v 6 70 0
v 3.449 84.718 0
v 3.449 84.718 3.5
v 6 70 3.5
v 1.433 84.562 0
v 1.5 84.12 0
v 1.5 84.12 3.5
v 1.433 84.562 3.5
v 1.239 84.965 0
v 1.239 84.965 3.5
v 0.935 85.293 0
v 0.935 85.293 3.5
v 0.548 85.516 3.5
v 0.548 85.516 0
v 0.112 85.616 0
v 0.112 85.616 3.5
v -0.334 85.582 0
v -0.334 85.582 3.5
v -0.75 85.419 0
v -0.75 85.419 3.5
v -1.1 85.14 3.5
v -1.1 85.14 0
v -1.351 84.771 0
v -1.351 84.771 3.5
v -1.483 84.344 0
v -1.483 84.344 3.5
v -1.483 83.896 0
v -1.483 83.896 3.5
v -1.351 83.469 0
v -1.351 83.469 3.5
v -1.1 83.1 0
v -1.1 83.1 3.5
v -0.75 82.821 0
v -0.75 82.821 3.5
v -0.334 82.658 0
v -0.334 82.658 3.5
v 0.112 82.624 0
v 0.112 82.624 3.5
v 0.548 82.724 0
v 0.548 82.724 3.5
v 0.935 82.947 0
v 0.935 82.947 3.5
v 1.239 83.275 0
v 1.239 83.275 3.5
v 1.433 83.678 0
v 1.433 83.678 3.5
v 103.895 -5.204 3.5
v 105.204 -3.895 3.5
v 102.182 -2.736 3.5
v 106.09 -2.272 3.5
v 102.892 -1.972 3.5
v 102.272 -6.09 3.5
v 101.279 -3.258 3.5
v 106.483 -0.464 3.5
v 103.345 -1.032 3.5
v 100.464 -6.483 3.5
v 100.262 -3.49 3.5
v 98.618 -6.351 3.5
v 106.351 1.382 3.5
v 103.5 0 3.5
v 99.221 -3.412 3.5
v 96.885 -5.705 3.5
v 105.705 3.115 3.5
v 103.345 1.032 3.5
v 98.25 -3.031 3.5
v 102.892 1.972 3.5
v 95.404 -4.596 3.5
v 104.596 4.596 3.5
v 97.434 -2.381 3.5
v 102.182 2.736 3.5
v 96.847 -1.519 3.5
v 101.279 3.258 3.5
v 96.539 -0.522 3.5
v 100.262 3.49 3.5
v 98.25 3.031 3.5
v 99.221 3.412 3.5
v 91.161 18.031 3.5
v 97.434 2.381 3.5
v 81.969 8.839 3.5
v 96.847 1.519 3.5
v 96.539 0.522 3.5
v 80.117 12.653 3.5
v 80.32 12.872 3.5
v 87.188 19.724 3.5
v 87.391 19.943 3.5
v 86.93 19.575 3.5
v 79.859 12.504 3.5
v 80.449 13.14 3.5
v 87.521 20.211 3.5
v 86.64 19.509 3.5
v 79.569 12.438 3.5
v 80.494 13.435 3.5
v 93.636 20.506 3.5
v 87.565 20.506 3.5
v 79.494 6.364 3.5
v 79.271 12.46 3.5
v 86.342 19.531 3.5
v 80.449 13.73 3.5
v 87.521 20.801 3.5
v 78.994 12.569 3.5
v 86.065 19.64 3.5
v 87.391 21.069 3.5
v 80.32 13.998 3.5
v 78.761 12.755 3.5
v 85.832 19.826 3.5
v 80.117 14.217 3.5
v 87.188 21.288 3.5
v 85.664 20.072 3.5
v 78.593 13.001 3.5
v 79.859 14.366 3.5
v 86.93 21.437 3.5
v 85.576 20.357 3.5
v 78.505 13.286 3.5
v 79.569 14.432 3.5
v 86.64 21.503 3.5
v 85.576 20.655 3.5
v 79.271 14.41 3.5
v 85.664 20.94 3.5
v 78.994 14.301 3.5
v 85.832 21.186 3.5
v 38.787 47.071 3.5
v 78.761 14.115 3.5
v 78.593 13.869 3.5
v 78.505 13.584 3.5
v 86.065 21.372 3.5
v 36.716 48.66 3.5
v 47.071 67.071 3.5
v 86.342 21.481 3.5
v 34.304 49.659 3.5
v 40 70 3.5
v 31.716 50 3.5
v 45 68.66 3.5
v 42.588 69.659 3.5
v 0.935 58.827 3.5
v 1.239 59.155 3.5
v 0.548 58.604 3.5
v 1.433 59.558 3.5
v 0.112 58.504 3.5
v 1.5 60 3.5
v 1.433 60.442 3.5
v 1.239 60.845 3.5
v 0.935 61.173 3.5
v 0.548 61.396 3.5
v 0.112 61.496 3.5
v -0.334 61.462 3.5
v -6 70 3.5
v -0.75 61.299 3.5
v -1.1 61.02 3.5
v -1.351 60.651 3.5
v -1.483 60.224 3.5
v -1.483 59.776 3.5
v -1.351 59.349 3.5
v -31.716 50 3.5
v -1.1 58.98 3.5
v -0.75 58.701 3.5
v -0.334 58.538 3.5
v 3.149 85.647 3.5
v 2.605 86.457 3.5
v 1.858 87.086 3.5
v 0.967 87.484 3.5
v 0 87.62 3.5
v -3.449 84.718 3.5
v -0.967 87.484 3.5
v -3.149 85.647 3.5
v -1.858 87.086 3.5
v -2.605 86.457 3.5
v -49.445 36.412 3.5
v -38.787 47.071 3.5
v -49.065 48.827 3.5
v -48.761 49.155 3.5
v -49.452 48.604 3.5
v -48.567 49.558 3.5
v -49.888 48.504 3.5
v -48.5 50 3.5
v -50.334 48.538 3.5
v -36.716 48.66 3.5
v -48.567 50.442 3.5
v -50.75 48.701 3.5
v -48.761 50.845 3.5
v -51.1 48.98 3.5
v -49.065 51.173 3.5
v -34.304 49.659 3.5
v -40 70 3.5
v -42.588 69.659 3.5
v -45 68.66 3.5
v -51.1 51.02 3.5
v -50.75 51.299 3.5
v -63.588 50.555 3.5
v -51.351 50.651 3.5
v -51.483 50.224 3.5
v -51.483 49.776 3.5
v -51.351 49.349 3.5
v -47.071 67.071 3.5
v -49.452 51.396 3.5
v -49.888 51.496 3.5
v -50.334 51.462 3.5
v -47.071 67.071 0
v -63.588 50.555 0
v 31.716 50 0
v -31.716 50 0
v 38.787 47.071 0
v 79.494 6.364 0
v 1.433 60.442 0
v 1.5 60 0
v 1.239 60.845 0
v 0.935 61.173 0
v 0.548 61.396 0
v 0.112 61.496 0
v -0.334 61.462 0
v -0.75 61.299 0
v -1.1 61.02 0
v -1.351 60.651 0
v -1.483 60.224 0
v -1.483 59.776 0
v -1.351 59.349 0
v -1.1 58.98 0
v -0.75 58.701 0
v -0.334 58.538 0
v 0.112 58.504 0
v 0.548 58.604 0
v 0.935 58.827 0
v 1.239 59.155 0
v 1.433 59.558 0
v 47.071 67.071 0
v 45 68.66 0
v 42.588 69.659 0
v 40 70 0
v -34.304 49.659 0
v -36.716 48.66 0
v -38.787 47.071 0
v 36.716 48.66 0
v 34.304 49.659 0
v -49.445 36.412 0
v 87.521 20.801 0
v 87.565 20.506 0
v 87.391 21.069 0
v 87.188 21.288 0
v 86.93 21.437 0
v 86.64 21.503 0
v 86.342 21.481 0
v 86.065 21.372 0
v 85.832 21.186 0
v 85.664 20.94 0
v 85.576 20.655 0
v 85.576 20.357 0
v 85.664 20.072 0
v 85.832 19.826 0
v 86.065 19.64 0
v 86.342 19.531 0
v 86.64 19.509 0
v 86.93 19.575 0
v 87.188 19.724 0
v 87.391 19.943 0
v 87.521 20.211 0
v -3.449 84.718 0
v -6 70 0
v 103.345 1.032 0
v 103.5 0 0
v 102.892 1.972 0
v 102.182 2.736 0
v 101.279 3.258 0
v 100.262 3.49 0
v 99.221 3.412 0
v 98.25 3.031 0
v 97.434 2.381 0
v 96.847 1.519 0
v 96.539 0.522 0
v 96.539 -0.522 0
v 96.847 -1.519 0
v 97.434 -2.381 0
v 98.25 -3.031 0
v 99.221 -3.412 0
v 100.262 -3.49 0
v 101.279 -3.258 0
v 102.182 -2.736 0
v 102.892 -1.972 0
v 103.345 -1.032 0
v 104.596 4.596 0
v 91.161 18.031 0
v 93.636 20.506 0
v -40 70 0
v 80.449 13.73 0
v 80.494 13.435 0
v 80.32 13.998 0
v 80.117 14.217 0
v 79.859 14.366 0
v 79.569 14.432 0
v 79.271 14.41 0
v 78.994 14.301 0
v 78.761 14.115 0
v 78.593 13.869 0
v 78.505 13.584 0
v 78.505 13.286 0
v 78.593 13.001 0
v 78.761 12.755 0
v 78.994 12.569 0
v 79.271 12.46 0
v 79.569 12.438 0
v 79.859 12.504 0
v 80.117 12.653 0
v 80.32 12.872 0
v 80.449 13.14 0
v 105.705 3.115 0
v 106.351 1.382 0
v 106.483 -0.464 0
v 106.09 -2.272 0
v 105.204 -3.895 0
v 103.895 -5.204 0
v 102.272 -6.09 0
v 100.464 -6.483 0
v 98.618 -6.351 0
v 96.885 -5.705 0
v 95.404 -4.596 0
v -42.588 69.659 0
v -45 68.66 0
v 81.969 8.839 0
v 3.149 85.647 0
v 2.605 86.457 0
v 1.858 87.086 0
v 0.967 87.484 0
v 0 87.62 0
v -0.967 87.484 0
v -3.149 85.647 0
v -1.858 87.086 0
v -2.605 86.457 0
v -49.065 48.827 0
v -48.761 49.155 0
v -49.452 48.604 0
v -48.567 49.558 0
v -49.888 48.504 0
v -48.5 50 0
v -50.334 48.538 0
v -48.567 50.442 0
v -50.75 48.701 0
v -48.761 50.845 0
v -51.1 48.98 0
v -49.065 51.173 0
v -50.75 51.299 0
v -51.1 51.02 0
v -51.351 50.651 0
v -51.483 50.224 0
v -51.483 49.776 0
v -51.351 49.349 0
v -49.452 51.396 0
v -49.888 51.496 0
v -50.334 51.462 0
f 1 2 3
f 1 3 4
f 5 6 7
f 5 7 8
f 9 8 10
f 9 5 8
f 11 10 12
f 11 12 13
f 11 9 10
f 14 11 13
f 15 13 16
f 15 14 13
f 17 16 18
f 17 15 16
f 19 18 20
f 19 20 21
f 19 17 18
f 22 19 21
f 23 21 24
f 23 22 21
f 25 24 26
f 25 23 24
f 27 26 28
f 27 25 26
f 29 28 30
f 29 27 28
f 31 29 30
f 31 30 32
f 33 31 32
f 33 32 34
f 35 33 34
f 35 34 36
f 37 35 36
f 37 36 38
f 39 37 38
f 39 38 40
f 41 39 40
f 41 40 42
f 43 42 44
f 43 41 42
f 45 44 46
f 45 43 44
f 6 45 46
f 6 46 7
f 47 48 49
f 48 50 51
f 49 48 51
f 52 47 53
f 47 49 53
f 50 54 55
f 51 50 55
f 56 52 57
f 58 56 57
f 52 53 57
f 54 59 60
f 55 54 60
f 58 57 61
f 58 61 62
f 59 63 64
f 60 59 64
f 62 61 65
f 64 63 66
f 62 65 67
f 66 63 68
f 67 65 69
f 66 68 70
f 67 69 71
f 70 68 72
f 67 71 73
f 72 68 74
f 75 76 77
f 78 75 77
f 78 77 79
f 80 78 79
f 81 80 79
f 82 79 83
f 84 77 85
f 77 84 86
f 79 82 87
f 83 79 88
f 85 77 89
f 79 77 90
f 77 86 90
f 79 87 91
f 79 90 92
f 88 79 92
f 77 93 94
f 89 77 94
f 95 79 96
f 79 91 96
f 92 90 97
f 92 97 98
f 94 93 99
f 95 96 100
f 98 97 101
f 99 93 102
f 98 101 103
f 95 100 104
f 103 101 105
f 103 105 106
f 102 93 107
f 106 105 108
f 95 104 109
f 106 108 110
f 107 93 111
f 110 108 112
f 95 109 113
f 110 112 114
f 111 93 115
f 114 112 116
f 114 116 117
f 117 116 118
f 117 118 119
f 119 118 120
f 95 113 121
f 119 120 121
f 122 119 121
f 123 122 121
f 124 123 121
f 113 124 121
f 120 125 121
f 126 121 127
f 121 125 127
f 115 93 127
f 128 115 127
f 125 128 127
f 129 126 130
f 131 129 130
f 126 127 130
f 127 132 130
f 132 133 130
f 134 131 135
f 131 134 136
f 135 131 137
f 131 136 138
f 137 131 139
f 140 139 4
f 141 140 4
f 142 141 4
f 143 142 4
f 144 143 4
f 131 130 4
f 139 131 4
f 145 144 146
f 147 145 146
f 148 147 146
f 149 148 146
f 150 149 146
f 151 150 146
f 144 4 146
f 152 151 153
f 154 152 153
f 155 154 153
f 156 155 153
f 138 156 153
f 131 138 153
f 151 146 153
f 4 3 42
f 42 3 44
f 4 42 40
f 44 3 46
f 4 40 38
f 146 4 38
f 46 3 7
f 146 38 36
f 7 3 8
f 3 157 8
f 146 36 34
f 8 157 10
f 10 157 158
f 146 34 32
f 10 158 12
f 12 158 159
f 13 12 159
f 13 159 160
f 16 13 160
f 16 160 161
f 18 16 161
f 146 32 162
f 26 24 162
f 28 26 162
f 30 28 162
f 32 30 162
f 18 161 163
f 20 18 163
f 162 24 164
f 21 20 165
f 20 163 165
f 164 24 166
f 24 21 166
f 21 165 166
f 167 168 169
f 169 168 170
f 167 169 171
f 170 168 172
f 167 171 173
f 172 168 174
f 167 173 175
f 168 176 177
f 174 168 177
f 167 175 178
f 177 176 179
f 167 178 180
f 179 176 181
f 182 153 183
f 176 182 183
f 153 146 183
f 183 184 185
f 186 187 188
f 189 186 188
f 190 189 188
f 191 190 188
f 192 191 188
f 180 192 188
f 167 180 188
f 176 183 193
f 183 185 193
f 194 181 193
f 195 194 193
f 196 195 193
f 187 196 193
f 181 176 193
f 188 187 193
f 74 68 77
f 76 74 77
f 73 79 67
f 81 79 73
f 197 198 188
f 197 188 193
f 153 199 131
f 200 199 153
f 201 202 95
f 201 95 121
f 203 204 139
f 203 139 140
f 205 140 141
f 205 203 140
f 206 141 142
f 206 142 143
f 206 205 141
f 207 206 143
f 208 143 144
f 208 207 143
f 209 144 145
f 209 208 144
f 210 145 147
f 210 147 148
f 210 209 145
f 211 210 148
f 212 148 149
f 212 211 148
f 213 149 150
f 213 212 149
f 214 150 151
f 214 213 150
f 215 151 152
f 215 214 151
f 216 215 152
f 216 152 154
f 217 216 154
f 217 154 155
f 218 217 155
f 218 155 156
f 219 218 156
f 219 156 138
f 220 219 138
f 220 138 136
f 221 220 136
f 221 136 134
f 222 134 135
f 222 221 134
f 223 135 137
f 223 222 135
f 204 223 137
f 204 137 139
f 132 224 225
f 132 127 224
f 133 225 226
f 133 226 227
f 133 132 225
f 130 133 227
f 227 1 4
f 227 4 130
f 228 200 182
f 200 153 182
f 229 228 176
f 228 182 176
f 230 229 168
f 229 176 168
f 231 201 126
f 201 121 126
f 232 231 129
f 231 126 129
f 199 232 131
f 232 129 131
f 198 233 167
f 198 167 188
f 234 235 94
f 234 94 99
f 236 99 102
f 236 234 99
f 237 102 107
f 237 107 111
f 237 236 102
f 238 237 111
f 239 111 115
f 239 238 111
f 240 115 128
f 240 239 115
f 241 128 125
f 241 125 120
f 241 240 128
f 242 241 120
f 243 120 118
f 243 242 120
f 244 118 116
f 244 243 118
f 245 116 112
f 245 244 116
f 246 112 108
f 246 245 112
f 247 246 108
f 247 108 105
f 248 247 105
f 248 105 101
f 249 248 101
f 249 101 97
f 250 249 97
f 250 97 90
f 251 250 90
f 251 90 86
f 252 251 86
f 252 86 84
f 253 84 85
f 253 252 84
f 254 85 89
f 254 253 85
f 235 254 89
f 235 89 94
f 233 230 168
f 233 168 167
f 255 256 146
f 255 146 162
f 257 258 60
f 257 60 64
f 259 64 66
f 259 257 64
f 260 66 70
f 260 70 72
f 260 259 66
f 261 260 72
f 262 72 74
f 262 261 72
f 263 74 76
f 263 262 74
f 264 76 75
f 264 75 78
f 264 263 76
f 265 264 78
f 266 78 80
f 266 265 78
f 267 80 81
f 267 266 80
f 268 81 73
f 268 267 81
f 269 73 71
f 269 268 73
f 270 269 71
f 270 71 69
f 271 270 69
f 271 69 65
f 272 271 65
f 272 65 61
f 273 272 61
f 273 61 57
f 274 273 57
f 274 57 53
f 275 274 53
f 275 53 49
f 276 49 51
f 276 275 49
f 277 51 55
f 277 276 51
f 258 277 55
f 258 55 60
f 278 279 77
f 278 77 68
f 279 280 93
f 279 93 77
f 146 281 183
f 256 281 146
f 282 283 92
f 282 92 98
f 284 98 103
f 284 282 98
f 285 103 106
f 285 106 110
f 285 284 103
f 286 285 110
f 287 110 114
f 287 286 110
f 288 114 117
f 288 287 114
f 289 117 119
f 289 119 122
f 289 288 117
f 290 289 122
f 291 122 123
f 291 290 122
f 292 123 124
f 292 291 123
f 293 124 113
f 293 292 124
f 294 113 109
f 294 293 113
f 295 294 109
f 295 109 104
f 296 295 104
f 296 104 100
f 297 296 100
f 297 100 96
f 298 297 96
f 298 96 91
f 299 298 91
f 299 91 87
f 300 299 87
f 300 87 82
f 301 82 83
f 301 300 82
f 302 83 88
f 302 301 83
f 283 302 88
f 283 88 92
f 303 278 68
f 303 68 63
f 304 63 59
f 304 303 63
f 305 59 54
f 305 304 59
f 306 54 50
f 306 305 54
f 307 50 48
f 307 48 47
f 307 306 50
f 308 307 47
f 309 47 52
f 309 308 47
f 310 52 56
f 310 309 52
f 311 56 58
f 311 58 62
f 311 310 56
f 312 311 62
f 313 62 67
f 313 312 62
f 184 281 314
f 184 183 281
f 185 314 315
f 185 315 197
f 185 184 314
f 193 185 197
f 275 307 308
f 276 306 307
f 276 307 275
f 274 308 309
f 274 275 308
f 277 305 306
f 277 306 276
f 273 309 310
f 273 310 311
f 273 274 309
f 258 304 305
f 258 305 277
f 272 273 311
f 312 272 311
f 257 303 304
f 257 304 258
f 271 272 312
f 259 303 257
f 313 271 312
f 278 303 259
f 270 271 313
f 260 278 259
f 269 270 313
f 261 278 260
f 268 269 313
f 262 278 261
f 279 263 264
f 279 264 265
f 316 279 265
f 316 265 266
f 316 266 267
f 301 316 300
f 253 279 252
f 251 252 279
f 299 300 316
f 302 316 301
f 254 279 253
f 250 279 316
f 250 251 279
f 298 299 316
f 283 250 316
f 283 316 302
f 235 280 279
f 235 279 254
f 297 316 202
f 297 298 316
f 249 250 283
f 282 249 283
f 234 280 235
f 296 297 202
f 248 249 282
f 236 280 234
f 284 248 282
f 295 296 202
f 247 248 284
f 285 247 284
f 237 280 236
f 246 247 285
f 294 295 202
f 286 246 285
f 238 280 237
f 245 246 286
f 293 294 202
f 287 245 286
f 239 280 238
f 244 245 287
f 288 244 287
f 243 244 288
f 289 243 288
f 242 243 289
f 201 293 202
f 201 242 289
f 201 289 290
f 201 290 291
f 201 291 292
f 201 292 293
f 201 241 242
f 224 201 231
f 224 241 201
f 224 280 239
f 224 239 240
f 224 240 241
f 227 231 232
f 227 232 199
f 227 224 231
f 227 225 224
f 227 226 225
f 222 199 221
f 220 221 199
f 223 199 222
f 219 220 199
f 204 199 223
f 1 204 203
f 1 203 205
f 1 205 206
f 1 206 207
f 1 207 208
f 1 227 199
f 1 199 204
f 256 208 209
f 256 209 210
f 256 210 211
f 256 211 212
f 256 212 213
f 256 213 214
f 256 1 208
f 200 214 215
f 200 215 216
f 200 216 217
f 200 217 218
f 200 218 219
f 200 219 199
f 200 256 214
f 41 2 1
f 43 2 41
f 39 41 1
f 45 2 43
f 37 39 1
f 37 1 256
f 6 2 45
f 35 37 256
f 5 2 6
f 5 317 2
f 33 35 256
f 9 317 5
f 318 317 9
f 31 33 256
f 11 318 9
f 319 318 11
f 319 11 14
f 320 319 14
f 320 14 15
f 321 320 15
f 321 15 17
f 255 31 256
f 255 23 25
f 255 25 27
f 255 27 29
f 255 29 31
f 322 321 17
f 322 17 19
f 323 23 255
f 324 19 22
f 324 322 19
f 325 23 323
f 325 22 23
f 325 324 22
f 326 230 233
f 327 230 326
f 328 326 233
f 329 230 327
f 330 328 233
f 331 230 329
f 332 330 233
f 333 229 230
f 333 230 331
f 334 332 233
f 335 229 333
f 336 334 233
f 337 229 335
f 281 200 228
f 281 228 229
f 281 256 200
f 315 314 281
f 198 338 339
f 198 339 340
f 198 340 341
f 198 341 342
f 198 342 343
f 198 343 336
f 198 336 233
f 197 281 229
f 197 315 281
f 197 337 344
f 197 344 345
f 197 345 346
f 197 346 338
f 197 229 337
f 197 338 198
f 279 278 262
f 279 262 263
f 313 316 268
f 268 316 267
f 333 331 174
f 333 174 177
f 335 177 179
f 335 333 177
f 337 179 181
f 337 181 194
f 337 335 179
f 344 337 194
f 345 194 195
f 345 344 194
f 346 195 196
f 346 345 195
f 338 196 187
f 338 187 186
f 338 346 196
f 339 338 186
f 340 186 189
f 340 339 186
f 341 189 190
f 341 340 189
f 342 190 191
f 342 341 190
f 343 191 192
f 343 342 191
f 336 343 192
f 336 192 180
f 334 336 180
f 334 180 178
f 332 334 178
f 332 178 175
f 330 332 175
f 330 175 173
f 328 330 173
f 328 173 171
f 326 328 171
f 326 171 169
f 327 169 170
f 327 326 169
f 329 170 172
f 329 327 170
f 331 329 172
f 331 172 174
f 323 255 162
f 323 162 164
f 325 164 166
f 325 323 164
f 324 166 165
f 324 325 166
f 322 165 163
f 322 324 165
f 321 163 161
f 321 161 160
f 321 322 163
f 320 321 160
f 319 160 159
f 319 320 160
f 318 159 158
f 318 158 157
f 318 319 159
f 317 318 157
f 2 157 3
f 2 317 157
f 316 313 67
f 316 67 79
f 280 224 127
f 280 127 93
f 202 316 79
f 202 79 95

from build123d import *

# Parameters (mm, degrees)
SKETCH5_R           = 1
SKETCH5_R_2         = 3.5
SKETCH5_R_3         = 1.5
BOSS_EXTRUDE1_DEPTH = 3.5
FILLET1_R           = 10


with BuildPart() as part:
    # Sketch5 → Boss-Extrude1 (new body)
    with BuildSketch(Plane.XY):
        with BuildLine():
            Line((91.161165235, 18.03122292), (104.596194078, 4.596194078))
            ThreePointArc((104.596194078, 4.596194078), (104.596194078, -4.596194078), (95.403805922, -4.596194078))
            Line((95.403805922, -4.596194078), (81.96877708, 8.838834765))
            Line((81.96877708, 8.838834765), (79.493903346, 6.363961031))
            Line((79.493903346, 6.363961031), (35.857864376, 50))
            Line((35.857864376, 50), (-35.857864376, 50))
            Line((-35.857864376, 50), (-49.445436483, 36.412427894))
            Line((-49.445436483, 36.412427894), (-63.587572106, 50.554563517))
            Line((-63.587572106, 50.554563517), (-44.142135624, 70))
            Line((-44.142135624, 70), (-6, 70))
            Line((-6, 70), (-3.448564481, 84.717831932))
            ThreePointArc((-3.448564481, 84.717831932), (0, 87.62), (3.448564481, 84.717831932))
            Line((3.448564481, 84.717831932), (6, 70))
            Line((6, 70), (44.142135624, 70))
            Line((44.142135624, 70), (93.636038969, 20.506096654))
            Line((93.636038969, 20.506096654), (91.161165235, 18.03122292))
        make_face()
        with Locations((86.564971157, 20.506096654)):
            Circle(SKETCH5_R, mode=Mode.SUBTRACT)
        with Locations((79.493903346, 13.435028843)):
            Circle(SKETCH5_R, mode=Mode.SUBTRACT)
        with Locations((100, 0)):
            Circle(SKETCH5_R_2, mode=Mode.SUBTRACT)
        with Locations((0, 84.12)):
            Circle(SKETCH5_R_3, mode=Mode.SUBTRACT)
        with Locations((0, 60)):
            Circle(SKETCH5_R_3, mode=Mode.SUBTRACT)
        with Locations((-50, 50)):
            Circle(SKETCH5_R_3, mode=Mode.SUBTRACT)
    extrude(amount=BOSS_EXTRUDE1_DEPTH)

    # Fillet1
    fillet1_edges = [part.edges().sort_by_distance(p)[0] for p in [
        (44.142135624, 70, 1.75),
        (35.857864376, 50, 1.75),
        (-35.857864376, 50, 1.75),
        (-44.142135624, 70, 1.75),
    ]]
    fillet(fillet1_edges, radius=FILLET1_R)


solid = part.part
